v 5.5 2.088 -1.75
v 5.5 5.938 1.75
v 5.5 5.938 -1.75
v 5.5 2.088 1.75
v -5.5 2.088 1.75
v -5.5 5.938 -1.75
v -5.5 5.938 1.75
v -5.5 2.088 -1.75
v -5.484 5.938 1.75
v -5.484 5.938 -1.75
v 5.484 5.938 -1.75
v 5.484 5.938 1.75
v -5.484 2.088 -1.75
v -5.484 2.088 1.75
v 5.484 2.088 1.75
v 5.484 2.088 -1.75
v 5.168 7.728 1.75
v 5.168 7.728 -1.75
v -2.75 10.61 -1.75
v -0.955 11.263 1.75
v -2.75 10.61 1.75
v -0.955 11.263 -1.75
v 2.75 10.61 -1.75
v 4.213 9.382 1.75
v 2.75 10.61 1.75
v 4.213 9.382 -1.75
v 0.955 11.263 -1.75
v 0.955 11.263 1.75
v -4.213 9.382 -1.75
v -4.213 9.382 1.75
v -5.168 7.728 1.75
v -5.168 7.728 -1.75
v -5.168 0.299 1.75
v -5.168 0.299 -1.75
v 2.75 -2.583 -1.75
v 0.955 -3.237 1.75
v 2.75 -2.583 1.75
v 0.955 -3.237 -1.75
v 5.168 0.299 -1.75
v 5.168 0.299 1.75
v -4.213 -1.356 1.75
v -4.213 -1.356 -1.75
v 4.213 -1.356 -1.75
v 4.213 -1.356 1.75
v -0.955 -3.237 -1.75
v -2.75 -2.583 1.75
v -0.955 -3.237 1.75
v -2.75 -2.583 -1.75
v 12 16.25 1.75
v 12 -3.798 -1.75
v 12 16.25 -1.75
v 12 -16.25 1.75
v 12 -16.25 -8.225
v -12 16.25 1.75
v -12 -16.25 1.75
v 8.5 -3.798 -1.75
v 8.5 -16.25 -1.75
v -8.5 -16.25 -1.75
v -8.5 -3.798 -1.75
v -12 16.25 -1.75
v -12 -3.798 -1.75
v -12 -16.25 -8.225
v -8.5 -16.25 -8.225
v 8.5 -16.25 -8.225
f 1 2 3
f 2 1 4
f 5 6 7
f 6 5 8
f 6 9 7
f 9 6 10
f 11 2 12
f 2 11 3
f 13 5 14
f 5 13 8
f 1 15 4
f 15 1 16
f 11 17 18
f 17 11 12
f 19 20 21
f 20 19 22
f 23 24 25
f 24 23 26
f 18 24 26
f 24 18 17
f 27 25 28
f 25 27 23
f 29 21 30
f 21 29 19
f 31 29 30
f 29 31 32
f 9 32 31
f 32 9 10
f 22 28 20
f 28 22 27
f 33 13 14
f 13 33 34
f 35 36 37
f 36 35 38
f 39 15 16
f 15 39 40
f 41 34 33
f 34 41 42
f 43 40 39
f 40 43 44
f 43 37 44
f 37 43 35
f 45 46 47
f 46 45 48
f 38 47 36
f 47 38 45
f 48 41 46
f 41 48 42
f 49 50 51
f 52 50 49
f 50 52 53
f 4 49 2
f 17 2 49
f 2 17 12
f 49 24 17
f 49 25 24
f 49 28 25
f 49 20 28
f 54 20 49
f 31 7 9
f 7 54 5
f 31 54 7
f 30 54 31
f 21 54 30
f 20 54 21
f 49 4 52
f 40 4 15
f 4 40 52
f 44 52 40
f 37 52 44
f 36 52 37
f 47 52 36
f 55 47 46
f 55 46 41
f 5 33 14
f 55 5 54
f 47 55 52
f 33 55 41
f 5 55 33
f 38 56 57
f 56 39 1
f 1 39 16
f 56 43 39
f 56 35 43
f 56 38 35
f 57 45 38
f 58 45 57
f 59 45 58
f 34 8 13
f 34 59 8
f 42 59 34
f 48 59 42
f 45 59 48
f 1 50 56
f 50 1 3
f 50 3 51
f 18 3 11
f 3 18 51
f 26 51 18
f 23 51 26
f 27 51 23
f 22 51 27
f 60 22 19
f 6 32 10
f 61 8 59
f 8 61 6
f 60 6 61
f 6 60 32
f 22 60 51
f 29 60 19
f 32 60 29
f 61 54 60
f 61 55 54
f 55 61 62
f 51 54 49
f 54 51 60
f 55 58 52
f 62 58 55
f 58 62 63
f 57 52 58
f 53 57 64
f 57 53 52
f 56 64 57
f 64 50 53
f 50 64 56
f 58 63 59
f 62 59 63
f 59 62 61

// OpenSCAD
/**
 * @file headlightCowlInstrumentBracket.scad
 *
 * @version 1.0
 *
 * @author Calum Judd Anderson
 *
 * @brief Fix for broken Aprilia ETX 125 instrument bracket that hangs off the headlight cowl.
 */
INTERFERENCE_FIT=0.001;
SLIDE_FIT=0.05;

module right_angle_triangle(base, height, thickness) {
    linear_extrude(height = thickness, center = true) {
        polygon(points = [[0, 0],          // The 90-degree corner at the origin
            [base, 0],       // The end of the flat base (X-axis)
            [0, height]      // The top vertex (Y-axis)
        ]);
    }
}

module originalBracketHole(bracketCubeHole, bracketHeight) {
    union() {
        cube([bracketCubeHole, 3.85, bracketHeight + SLIDE_FIT], center=true);
        translate([0, bracketCubeHole/6, 0])
            cylinder(bracketHeight + SLIDE_FIT, d=bracketCubeHole, center=true);
        translate([0, -bracketCubeHole/6, 0])
            cylinder(bracketHeight + SLIDE_FIT, d=bracketCubeHole, center=true);
    }
}

module originalSupportingBracket(triangleThickness) {
    triangleHeight = 10.00 - triangleThickness;
    triangleBase = 12.50;
    
    rotate([-90, 0, 90])
        translate([0, (triangleHeight/4) + 0.1, 0])
            right_angle_triangle(triangleBase, triangleHeight, triangleThickness);
}

module originalBracketPiece(bracketWidth, bracketHeight, bracketLength, bracketCubeHole) {
    bracketHoleDistanceFromTop = 5.00;
    bracketHoleComputeDistanceFromTop = (bracketLength/2) - (bracketCubeHole/1.52) - bracketHoleDistanceFromTop;
    
    difference() {
            cube([bracketWidth, bracketLength, bracketHeight], center=true);

            translate([0, bracketHoleComputeDistanceFromTop, 0])
                originalBracketHole(bracketCubeHole, bracketHeight);
            
            
        }
}

module instrumentBracket() {
    bracketWidth = 24.00;
    bracketHeight = 3.50;
    bracketLength = 32.50;
    
    bracketCubeHole = 11.00;
    
    union() {
        /* Left Bracket */
        translate([(bracketWidth-bracketHeight)/2, -bracketLength/2, 0])
            originalSupportingBracket(bracketHeight);

        originalBracketPiece(bracketWidth, bracketHeight, bracketLength, bracketCubeHole);
        
        /* Right Bracket */
        translate([-(bracketWidth-bracketHeight)/2, -bracketLength/2, 0])
            originalSupportingBracket(bracketHeight);
    }
}

instrumentBracket();
